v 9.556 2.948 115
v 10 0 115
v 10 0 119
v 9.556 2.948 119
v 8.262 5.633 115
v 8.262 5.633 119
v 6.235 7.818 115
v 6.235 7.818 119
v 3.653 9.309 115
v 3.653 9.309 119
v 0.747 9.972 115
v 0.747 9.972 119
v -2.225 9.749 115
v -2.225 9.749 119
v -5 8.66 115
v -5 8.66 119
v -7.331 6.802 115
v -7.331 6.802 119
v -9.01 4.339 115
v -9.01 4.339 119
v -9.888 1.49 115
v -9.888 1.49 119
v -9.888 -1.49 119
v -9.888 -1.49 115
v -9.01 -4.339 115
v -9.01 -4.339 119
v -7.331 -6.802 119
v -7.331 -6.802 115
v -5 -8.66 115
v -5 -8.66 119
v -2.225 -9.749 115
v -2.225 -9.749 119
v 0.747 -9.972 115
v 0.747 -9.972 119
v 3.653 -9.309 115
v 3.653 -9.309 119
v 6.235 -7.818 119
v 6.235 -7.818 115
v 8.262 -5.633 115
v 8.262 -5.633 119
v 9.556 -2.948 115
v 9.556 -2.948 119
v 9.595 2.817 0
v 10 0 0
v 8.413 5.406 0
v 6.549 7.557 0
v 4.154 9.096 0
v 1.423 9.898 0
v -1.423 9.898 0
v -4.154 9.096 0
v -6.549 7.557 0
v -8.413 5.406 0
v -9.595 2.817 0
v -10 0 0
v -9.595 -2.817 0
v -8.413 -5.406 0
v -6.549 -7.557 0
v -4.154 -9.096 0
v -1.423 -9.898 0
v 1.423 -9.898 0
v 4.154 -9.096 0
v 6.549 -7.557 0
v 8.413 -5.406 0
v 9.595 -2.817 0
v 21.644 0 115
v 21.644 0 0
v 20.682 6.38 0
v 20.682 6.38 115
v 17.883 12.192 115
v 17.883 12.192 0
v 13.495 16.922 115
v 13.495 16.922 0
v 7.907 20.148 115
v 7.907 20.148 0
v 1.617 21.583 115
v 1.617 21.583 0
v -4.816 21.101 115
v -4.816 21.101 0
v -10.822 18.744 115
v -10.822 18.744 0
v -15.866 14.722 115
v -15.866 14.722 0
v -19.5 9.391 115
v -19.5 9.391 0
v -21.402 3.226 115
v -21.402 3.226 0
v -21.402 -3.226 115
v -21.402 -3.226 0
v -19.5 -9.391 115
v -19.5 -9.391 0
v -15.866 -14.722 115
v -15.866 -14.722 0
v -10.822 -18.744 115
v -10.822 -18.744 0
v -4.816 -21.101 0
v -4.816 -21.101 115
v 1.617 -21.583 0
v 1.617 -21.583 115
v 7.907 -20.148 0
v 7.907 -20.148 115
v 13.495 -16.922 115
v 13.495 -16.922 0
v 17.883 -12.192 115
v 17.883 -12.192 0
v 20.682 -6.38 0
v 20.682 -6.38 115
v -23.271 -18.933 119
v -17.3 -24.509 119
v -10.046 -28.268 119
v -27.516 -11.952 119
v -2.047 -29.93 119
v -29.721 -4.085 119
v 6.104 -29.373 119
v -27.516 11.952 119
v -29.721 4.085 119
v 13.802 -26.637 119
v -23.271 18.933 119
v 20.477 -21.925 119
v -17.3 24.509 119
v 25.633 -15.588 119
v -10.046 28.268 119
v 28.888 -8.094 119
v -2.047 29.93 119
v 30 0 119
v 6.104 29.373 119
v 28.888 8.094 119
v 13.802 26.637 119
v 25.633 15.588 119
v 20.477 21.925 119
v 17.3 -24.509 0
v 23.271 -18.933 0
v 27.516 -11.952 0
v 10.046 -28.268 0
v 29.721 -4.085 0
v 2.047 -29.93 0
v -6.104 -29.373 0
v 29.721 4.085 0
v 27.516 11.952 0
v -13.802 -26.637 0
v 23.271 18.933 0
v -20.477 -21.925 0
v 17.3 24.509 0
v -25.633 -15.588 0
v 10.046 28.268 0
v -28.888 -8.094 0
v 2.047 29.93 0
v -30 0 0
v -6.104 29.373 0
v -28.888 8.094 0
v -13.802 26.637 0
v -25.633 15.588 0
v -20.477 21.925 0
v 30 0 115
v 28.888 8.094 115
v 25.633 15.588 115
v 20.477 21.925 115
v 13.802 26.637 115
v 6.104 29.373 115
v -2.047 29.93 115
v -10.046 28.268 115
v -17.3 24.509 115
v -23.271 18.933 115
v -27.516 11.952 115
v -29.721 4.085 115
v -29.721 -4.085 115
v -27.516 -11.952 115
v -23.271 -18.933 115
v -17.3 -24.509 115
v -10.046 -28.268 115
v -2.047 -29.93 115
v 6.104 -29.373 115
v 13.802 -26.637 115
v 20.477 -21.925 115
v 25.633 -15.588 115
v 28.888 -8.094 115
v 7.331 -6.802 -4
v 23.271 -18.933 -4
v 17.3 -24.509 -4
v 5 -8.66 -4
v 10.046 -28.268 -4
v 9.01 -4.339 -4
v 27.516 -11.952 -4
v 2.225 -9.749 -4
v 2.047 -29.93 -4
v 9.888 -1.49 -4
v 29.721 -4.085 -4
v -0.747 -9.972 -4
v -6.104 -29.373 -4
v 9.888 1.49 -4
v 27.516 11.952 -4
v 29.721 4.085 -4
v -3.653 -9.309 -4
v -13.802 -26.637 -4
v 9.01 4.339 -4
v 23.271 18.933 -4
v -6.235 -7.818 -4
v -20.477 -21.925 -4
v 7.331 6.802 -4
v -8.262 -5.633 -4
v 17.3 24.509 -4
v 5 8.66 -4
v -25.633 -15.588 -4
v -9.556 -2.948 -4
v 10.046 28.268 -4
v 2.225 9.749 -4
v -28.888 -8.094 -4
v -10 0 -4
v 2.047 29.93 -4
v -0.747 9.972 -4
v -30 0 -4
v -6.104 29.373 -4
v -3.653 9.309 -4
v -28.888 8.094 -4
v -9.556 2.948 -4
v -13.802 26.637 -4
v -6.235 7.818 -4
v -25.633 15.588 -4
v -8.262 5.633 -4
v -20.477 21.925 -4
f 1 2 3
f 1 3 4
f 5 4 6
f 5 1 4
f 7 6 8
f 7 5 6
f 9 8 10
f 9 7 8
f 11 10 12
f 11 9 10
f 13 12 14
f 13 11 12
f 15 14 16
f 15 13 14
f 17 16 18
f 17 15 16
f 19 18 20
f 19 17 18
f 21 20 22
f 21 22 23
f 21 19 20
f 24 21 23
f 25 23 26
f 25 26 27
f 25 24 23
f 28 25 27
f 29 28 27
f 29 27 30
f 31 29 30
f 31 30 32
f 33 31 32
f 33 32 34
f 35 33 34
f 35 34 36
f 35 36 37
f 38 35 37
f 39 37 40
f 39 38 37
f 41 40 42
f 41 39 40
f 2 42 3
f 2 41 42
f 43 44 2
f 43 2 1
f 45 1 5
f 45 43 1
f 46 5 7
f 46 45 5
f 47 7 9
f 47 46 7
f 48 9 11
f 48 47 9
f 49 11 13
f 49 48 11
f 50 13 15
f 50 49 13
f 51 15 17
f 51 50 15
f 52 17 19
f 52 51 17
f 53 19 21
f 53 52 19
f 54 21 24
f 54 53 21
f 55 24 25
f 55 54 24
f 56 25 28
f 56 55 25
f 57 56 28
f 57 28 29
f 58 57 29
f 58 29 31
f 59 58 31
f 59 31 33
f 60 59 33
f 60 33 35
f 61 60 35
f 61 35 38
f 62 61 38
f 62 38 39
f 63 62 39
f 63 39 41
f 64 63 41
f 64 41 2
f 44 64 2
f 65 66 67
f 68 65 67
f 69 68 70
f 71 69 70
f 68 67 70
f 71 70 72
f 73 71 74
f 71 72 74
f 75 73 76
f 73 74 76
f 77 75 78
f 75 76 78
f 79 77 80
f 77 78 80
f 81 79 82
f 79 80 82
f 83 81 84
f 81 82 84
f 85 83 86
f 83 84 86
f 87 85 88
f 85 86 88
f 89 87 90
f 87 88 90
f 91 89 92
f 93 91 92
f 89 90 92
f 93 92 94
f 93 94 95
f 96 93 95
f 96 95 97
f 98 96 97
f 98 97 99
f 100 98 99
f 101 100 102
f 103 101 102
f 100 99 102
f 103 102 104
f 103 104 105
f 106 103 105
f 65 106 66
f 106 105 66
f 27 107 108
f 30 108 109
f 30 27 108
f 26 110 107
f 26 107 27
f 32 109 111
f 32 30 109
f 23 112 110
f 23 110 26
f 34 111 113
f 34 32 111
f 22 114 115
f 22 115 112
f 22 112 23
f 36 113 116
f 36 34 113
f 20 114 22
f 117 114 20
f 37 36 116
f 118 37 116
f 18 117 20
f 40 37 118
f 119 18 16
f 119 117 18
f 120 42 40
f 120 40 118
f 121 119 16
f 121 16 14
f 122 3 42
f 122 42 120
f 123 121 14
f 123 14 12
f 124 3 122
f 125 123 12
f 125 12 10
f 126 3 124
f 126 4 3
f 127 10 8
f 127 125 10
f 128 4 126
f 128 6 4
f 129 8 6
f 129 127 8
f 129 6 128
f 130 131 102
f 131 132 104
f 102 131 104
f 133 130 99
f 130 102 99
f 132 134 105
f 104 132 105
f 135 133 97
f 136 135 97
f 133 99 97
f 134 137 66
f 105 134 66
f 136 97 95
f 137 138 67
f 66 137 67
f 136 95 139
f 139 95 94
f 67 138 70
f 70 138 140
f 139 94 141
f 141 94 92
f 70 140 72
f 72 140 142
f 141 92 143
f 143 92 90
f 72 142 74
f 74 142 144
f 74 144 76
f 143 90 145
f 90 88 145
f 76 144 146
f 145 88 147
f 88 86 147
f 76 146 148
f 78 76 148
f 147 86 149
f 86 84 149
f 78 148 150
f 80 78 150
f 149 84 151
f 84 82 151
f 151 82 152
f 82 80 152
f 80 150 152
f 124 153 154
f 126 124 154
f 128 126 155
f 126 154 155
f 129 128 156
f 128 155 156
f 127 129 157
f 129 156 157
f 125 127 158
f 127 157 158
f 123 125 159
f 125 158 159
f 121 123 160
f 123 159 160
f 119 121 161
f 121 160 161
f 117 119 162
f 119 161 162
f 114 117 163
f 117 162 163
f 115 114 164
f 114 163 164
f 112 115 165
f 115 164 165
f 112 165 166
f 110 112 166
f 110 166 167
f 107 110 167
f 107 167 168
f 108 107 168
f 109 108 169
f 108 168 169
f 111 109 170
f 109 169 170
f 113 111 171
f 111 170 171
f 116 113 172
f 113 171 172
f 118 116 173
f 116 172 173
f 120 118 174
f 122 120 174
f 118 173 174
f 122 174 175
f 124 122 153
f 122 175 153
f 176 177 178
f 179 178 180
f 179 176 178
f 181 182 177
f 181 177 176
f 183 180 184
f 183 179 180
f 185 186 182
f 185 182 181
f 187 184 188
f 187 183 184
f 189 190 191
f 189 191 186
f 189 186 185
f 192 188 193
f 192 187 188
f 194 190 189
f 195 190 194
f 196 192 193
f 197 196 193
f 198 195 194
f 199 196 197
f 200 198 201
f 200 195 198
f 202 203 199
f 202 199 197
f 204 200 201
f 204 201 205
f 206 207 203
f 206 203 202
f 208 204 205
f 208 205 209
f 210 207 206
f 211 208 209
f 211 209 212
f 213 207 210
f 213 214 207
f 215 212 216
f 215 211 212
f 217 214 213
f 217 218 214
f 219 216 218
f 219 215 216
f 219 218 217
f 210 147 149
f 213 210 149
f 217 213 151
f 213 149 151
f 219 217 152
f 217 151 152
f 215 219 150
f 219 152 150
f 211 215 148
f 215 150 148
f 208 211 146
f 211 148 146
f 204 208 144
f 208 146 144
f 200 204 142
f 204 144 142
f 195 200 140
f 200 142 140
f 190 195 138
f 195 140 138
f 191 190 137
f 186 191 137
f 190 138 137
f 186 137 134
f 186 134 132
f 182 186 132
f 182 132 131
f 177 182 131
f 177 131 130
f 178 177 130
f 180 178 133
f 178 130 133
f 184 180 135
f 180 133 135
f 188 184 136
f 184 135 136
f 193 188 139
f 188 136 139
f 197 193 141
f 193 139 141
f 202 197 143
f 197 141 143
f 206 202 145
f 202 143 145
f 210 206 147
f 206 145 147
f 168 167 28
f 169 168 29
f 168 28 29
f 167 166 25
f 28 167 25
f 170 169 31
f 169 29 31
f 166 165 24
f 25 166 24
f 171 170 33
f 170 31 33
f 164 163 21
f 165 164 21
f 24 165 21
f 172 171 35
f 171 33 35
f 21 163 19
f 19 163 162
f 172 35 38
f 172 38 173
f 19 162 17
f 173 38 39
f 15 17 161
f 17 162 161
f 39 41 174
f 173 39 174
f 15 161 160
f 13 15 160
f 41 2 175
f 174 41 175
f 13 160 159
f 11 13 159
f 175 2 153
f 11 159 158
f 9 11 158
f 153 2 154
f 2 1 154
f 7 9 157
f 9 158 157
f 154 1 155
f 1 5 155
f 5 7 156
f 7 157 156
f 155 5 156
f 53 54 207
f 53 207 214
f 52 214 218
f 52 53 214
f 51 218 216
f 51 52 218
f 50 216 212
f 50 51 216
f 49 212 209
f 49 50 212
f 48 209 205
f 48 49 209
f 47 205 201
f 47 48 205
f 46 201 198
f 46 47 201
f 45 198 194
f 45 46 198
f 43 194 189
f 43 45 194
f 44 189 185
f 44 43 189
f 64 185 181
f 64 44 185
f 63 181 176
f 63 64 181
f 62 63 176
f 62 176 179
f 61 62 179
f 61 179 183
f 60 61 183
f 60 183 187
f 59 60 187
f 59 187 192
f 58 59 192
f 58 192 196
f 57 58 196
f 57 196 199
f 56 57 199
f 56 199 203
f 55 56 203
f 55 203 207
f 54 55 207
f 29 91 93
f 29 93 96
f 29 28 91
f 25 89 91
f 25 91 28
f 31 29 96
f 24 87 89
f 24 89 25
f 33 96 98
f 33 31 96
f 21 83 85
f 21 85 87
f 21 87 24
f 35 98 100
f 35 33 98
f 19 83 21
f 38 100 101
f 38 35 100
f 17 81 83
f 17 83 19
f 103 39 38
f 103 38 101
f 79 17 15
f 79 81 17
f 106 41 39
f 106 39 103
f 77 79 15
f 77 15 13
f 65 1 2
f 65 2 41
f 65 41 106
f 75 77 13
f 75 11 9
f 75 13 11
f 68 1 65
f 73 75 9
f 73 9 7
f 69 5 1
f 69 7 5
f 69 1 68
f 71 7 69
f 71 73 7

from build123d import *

# Parameters (mm, degrees)
SKETCH1_R           = 21.643869335
SKETCH1_R_2         = 10
BOSS_EXTRUDE1_DEPTH = 115
SKETCH2_R           = 30
SKETCH2_R_2         = 10
BOSS_EXTRUDE2_DEPTH = 4
SKETCH3_R           = 30
SKETCH3_R_2         = 10
BOSS_EXTRUDE3_DEPTH = 4


with BuildPart() as part:
    # Sketch1 → Boss-Extrude1 (new body)
    with BuildSketch(Plane.XY):
        Circle(SKETCH1_R)
        Circle(SKETCH1_R_2, mode=Mode.SUBTRACT)
    extrude(amount=BOSS_EXTRUDE1_DEPTH)

    # Sketch3 → Boss-Extrude3 (add)
    with BuildSketch(Plane(origin=(0, 0, 0), x_dir=(-1, 0, 0), z_dir=(0, 0, -1))):
        Circle(SKETCH3_R)
        Circle(SKETCH3_R_2, mode=Mode.SUBTRACT)
    extrude(amount=BOSS_EXTRUDE3_DEPTH)


with BuildPart() as body_2:
    # Sketch2 → Boss-Extrude2 (new body)
    with BuildSketch(Plane.XY.offset(115)):
        Circle(SKETCH2_R)
        Circle(SKETCH2_R_2, mode=Mode.SUBTRACT)
    extrude(amount=BOSS_EXTRUDE2_DEPTH)


solid = Compound([part.part, body_2.part])
